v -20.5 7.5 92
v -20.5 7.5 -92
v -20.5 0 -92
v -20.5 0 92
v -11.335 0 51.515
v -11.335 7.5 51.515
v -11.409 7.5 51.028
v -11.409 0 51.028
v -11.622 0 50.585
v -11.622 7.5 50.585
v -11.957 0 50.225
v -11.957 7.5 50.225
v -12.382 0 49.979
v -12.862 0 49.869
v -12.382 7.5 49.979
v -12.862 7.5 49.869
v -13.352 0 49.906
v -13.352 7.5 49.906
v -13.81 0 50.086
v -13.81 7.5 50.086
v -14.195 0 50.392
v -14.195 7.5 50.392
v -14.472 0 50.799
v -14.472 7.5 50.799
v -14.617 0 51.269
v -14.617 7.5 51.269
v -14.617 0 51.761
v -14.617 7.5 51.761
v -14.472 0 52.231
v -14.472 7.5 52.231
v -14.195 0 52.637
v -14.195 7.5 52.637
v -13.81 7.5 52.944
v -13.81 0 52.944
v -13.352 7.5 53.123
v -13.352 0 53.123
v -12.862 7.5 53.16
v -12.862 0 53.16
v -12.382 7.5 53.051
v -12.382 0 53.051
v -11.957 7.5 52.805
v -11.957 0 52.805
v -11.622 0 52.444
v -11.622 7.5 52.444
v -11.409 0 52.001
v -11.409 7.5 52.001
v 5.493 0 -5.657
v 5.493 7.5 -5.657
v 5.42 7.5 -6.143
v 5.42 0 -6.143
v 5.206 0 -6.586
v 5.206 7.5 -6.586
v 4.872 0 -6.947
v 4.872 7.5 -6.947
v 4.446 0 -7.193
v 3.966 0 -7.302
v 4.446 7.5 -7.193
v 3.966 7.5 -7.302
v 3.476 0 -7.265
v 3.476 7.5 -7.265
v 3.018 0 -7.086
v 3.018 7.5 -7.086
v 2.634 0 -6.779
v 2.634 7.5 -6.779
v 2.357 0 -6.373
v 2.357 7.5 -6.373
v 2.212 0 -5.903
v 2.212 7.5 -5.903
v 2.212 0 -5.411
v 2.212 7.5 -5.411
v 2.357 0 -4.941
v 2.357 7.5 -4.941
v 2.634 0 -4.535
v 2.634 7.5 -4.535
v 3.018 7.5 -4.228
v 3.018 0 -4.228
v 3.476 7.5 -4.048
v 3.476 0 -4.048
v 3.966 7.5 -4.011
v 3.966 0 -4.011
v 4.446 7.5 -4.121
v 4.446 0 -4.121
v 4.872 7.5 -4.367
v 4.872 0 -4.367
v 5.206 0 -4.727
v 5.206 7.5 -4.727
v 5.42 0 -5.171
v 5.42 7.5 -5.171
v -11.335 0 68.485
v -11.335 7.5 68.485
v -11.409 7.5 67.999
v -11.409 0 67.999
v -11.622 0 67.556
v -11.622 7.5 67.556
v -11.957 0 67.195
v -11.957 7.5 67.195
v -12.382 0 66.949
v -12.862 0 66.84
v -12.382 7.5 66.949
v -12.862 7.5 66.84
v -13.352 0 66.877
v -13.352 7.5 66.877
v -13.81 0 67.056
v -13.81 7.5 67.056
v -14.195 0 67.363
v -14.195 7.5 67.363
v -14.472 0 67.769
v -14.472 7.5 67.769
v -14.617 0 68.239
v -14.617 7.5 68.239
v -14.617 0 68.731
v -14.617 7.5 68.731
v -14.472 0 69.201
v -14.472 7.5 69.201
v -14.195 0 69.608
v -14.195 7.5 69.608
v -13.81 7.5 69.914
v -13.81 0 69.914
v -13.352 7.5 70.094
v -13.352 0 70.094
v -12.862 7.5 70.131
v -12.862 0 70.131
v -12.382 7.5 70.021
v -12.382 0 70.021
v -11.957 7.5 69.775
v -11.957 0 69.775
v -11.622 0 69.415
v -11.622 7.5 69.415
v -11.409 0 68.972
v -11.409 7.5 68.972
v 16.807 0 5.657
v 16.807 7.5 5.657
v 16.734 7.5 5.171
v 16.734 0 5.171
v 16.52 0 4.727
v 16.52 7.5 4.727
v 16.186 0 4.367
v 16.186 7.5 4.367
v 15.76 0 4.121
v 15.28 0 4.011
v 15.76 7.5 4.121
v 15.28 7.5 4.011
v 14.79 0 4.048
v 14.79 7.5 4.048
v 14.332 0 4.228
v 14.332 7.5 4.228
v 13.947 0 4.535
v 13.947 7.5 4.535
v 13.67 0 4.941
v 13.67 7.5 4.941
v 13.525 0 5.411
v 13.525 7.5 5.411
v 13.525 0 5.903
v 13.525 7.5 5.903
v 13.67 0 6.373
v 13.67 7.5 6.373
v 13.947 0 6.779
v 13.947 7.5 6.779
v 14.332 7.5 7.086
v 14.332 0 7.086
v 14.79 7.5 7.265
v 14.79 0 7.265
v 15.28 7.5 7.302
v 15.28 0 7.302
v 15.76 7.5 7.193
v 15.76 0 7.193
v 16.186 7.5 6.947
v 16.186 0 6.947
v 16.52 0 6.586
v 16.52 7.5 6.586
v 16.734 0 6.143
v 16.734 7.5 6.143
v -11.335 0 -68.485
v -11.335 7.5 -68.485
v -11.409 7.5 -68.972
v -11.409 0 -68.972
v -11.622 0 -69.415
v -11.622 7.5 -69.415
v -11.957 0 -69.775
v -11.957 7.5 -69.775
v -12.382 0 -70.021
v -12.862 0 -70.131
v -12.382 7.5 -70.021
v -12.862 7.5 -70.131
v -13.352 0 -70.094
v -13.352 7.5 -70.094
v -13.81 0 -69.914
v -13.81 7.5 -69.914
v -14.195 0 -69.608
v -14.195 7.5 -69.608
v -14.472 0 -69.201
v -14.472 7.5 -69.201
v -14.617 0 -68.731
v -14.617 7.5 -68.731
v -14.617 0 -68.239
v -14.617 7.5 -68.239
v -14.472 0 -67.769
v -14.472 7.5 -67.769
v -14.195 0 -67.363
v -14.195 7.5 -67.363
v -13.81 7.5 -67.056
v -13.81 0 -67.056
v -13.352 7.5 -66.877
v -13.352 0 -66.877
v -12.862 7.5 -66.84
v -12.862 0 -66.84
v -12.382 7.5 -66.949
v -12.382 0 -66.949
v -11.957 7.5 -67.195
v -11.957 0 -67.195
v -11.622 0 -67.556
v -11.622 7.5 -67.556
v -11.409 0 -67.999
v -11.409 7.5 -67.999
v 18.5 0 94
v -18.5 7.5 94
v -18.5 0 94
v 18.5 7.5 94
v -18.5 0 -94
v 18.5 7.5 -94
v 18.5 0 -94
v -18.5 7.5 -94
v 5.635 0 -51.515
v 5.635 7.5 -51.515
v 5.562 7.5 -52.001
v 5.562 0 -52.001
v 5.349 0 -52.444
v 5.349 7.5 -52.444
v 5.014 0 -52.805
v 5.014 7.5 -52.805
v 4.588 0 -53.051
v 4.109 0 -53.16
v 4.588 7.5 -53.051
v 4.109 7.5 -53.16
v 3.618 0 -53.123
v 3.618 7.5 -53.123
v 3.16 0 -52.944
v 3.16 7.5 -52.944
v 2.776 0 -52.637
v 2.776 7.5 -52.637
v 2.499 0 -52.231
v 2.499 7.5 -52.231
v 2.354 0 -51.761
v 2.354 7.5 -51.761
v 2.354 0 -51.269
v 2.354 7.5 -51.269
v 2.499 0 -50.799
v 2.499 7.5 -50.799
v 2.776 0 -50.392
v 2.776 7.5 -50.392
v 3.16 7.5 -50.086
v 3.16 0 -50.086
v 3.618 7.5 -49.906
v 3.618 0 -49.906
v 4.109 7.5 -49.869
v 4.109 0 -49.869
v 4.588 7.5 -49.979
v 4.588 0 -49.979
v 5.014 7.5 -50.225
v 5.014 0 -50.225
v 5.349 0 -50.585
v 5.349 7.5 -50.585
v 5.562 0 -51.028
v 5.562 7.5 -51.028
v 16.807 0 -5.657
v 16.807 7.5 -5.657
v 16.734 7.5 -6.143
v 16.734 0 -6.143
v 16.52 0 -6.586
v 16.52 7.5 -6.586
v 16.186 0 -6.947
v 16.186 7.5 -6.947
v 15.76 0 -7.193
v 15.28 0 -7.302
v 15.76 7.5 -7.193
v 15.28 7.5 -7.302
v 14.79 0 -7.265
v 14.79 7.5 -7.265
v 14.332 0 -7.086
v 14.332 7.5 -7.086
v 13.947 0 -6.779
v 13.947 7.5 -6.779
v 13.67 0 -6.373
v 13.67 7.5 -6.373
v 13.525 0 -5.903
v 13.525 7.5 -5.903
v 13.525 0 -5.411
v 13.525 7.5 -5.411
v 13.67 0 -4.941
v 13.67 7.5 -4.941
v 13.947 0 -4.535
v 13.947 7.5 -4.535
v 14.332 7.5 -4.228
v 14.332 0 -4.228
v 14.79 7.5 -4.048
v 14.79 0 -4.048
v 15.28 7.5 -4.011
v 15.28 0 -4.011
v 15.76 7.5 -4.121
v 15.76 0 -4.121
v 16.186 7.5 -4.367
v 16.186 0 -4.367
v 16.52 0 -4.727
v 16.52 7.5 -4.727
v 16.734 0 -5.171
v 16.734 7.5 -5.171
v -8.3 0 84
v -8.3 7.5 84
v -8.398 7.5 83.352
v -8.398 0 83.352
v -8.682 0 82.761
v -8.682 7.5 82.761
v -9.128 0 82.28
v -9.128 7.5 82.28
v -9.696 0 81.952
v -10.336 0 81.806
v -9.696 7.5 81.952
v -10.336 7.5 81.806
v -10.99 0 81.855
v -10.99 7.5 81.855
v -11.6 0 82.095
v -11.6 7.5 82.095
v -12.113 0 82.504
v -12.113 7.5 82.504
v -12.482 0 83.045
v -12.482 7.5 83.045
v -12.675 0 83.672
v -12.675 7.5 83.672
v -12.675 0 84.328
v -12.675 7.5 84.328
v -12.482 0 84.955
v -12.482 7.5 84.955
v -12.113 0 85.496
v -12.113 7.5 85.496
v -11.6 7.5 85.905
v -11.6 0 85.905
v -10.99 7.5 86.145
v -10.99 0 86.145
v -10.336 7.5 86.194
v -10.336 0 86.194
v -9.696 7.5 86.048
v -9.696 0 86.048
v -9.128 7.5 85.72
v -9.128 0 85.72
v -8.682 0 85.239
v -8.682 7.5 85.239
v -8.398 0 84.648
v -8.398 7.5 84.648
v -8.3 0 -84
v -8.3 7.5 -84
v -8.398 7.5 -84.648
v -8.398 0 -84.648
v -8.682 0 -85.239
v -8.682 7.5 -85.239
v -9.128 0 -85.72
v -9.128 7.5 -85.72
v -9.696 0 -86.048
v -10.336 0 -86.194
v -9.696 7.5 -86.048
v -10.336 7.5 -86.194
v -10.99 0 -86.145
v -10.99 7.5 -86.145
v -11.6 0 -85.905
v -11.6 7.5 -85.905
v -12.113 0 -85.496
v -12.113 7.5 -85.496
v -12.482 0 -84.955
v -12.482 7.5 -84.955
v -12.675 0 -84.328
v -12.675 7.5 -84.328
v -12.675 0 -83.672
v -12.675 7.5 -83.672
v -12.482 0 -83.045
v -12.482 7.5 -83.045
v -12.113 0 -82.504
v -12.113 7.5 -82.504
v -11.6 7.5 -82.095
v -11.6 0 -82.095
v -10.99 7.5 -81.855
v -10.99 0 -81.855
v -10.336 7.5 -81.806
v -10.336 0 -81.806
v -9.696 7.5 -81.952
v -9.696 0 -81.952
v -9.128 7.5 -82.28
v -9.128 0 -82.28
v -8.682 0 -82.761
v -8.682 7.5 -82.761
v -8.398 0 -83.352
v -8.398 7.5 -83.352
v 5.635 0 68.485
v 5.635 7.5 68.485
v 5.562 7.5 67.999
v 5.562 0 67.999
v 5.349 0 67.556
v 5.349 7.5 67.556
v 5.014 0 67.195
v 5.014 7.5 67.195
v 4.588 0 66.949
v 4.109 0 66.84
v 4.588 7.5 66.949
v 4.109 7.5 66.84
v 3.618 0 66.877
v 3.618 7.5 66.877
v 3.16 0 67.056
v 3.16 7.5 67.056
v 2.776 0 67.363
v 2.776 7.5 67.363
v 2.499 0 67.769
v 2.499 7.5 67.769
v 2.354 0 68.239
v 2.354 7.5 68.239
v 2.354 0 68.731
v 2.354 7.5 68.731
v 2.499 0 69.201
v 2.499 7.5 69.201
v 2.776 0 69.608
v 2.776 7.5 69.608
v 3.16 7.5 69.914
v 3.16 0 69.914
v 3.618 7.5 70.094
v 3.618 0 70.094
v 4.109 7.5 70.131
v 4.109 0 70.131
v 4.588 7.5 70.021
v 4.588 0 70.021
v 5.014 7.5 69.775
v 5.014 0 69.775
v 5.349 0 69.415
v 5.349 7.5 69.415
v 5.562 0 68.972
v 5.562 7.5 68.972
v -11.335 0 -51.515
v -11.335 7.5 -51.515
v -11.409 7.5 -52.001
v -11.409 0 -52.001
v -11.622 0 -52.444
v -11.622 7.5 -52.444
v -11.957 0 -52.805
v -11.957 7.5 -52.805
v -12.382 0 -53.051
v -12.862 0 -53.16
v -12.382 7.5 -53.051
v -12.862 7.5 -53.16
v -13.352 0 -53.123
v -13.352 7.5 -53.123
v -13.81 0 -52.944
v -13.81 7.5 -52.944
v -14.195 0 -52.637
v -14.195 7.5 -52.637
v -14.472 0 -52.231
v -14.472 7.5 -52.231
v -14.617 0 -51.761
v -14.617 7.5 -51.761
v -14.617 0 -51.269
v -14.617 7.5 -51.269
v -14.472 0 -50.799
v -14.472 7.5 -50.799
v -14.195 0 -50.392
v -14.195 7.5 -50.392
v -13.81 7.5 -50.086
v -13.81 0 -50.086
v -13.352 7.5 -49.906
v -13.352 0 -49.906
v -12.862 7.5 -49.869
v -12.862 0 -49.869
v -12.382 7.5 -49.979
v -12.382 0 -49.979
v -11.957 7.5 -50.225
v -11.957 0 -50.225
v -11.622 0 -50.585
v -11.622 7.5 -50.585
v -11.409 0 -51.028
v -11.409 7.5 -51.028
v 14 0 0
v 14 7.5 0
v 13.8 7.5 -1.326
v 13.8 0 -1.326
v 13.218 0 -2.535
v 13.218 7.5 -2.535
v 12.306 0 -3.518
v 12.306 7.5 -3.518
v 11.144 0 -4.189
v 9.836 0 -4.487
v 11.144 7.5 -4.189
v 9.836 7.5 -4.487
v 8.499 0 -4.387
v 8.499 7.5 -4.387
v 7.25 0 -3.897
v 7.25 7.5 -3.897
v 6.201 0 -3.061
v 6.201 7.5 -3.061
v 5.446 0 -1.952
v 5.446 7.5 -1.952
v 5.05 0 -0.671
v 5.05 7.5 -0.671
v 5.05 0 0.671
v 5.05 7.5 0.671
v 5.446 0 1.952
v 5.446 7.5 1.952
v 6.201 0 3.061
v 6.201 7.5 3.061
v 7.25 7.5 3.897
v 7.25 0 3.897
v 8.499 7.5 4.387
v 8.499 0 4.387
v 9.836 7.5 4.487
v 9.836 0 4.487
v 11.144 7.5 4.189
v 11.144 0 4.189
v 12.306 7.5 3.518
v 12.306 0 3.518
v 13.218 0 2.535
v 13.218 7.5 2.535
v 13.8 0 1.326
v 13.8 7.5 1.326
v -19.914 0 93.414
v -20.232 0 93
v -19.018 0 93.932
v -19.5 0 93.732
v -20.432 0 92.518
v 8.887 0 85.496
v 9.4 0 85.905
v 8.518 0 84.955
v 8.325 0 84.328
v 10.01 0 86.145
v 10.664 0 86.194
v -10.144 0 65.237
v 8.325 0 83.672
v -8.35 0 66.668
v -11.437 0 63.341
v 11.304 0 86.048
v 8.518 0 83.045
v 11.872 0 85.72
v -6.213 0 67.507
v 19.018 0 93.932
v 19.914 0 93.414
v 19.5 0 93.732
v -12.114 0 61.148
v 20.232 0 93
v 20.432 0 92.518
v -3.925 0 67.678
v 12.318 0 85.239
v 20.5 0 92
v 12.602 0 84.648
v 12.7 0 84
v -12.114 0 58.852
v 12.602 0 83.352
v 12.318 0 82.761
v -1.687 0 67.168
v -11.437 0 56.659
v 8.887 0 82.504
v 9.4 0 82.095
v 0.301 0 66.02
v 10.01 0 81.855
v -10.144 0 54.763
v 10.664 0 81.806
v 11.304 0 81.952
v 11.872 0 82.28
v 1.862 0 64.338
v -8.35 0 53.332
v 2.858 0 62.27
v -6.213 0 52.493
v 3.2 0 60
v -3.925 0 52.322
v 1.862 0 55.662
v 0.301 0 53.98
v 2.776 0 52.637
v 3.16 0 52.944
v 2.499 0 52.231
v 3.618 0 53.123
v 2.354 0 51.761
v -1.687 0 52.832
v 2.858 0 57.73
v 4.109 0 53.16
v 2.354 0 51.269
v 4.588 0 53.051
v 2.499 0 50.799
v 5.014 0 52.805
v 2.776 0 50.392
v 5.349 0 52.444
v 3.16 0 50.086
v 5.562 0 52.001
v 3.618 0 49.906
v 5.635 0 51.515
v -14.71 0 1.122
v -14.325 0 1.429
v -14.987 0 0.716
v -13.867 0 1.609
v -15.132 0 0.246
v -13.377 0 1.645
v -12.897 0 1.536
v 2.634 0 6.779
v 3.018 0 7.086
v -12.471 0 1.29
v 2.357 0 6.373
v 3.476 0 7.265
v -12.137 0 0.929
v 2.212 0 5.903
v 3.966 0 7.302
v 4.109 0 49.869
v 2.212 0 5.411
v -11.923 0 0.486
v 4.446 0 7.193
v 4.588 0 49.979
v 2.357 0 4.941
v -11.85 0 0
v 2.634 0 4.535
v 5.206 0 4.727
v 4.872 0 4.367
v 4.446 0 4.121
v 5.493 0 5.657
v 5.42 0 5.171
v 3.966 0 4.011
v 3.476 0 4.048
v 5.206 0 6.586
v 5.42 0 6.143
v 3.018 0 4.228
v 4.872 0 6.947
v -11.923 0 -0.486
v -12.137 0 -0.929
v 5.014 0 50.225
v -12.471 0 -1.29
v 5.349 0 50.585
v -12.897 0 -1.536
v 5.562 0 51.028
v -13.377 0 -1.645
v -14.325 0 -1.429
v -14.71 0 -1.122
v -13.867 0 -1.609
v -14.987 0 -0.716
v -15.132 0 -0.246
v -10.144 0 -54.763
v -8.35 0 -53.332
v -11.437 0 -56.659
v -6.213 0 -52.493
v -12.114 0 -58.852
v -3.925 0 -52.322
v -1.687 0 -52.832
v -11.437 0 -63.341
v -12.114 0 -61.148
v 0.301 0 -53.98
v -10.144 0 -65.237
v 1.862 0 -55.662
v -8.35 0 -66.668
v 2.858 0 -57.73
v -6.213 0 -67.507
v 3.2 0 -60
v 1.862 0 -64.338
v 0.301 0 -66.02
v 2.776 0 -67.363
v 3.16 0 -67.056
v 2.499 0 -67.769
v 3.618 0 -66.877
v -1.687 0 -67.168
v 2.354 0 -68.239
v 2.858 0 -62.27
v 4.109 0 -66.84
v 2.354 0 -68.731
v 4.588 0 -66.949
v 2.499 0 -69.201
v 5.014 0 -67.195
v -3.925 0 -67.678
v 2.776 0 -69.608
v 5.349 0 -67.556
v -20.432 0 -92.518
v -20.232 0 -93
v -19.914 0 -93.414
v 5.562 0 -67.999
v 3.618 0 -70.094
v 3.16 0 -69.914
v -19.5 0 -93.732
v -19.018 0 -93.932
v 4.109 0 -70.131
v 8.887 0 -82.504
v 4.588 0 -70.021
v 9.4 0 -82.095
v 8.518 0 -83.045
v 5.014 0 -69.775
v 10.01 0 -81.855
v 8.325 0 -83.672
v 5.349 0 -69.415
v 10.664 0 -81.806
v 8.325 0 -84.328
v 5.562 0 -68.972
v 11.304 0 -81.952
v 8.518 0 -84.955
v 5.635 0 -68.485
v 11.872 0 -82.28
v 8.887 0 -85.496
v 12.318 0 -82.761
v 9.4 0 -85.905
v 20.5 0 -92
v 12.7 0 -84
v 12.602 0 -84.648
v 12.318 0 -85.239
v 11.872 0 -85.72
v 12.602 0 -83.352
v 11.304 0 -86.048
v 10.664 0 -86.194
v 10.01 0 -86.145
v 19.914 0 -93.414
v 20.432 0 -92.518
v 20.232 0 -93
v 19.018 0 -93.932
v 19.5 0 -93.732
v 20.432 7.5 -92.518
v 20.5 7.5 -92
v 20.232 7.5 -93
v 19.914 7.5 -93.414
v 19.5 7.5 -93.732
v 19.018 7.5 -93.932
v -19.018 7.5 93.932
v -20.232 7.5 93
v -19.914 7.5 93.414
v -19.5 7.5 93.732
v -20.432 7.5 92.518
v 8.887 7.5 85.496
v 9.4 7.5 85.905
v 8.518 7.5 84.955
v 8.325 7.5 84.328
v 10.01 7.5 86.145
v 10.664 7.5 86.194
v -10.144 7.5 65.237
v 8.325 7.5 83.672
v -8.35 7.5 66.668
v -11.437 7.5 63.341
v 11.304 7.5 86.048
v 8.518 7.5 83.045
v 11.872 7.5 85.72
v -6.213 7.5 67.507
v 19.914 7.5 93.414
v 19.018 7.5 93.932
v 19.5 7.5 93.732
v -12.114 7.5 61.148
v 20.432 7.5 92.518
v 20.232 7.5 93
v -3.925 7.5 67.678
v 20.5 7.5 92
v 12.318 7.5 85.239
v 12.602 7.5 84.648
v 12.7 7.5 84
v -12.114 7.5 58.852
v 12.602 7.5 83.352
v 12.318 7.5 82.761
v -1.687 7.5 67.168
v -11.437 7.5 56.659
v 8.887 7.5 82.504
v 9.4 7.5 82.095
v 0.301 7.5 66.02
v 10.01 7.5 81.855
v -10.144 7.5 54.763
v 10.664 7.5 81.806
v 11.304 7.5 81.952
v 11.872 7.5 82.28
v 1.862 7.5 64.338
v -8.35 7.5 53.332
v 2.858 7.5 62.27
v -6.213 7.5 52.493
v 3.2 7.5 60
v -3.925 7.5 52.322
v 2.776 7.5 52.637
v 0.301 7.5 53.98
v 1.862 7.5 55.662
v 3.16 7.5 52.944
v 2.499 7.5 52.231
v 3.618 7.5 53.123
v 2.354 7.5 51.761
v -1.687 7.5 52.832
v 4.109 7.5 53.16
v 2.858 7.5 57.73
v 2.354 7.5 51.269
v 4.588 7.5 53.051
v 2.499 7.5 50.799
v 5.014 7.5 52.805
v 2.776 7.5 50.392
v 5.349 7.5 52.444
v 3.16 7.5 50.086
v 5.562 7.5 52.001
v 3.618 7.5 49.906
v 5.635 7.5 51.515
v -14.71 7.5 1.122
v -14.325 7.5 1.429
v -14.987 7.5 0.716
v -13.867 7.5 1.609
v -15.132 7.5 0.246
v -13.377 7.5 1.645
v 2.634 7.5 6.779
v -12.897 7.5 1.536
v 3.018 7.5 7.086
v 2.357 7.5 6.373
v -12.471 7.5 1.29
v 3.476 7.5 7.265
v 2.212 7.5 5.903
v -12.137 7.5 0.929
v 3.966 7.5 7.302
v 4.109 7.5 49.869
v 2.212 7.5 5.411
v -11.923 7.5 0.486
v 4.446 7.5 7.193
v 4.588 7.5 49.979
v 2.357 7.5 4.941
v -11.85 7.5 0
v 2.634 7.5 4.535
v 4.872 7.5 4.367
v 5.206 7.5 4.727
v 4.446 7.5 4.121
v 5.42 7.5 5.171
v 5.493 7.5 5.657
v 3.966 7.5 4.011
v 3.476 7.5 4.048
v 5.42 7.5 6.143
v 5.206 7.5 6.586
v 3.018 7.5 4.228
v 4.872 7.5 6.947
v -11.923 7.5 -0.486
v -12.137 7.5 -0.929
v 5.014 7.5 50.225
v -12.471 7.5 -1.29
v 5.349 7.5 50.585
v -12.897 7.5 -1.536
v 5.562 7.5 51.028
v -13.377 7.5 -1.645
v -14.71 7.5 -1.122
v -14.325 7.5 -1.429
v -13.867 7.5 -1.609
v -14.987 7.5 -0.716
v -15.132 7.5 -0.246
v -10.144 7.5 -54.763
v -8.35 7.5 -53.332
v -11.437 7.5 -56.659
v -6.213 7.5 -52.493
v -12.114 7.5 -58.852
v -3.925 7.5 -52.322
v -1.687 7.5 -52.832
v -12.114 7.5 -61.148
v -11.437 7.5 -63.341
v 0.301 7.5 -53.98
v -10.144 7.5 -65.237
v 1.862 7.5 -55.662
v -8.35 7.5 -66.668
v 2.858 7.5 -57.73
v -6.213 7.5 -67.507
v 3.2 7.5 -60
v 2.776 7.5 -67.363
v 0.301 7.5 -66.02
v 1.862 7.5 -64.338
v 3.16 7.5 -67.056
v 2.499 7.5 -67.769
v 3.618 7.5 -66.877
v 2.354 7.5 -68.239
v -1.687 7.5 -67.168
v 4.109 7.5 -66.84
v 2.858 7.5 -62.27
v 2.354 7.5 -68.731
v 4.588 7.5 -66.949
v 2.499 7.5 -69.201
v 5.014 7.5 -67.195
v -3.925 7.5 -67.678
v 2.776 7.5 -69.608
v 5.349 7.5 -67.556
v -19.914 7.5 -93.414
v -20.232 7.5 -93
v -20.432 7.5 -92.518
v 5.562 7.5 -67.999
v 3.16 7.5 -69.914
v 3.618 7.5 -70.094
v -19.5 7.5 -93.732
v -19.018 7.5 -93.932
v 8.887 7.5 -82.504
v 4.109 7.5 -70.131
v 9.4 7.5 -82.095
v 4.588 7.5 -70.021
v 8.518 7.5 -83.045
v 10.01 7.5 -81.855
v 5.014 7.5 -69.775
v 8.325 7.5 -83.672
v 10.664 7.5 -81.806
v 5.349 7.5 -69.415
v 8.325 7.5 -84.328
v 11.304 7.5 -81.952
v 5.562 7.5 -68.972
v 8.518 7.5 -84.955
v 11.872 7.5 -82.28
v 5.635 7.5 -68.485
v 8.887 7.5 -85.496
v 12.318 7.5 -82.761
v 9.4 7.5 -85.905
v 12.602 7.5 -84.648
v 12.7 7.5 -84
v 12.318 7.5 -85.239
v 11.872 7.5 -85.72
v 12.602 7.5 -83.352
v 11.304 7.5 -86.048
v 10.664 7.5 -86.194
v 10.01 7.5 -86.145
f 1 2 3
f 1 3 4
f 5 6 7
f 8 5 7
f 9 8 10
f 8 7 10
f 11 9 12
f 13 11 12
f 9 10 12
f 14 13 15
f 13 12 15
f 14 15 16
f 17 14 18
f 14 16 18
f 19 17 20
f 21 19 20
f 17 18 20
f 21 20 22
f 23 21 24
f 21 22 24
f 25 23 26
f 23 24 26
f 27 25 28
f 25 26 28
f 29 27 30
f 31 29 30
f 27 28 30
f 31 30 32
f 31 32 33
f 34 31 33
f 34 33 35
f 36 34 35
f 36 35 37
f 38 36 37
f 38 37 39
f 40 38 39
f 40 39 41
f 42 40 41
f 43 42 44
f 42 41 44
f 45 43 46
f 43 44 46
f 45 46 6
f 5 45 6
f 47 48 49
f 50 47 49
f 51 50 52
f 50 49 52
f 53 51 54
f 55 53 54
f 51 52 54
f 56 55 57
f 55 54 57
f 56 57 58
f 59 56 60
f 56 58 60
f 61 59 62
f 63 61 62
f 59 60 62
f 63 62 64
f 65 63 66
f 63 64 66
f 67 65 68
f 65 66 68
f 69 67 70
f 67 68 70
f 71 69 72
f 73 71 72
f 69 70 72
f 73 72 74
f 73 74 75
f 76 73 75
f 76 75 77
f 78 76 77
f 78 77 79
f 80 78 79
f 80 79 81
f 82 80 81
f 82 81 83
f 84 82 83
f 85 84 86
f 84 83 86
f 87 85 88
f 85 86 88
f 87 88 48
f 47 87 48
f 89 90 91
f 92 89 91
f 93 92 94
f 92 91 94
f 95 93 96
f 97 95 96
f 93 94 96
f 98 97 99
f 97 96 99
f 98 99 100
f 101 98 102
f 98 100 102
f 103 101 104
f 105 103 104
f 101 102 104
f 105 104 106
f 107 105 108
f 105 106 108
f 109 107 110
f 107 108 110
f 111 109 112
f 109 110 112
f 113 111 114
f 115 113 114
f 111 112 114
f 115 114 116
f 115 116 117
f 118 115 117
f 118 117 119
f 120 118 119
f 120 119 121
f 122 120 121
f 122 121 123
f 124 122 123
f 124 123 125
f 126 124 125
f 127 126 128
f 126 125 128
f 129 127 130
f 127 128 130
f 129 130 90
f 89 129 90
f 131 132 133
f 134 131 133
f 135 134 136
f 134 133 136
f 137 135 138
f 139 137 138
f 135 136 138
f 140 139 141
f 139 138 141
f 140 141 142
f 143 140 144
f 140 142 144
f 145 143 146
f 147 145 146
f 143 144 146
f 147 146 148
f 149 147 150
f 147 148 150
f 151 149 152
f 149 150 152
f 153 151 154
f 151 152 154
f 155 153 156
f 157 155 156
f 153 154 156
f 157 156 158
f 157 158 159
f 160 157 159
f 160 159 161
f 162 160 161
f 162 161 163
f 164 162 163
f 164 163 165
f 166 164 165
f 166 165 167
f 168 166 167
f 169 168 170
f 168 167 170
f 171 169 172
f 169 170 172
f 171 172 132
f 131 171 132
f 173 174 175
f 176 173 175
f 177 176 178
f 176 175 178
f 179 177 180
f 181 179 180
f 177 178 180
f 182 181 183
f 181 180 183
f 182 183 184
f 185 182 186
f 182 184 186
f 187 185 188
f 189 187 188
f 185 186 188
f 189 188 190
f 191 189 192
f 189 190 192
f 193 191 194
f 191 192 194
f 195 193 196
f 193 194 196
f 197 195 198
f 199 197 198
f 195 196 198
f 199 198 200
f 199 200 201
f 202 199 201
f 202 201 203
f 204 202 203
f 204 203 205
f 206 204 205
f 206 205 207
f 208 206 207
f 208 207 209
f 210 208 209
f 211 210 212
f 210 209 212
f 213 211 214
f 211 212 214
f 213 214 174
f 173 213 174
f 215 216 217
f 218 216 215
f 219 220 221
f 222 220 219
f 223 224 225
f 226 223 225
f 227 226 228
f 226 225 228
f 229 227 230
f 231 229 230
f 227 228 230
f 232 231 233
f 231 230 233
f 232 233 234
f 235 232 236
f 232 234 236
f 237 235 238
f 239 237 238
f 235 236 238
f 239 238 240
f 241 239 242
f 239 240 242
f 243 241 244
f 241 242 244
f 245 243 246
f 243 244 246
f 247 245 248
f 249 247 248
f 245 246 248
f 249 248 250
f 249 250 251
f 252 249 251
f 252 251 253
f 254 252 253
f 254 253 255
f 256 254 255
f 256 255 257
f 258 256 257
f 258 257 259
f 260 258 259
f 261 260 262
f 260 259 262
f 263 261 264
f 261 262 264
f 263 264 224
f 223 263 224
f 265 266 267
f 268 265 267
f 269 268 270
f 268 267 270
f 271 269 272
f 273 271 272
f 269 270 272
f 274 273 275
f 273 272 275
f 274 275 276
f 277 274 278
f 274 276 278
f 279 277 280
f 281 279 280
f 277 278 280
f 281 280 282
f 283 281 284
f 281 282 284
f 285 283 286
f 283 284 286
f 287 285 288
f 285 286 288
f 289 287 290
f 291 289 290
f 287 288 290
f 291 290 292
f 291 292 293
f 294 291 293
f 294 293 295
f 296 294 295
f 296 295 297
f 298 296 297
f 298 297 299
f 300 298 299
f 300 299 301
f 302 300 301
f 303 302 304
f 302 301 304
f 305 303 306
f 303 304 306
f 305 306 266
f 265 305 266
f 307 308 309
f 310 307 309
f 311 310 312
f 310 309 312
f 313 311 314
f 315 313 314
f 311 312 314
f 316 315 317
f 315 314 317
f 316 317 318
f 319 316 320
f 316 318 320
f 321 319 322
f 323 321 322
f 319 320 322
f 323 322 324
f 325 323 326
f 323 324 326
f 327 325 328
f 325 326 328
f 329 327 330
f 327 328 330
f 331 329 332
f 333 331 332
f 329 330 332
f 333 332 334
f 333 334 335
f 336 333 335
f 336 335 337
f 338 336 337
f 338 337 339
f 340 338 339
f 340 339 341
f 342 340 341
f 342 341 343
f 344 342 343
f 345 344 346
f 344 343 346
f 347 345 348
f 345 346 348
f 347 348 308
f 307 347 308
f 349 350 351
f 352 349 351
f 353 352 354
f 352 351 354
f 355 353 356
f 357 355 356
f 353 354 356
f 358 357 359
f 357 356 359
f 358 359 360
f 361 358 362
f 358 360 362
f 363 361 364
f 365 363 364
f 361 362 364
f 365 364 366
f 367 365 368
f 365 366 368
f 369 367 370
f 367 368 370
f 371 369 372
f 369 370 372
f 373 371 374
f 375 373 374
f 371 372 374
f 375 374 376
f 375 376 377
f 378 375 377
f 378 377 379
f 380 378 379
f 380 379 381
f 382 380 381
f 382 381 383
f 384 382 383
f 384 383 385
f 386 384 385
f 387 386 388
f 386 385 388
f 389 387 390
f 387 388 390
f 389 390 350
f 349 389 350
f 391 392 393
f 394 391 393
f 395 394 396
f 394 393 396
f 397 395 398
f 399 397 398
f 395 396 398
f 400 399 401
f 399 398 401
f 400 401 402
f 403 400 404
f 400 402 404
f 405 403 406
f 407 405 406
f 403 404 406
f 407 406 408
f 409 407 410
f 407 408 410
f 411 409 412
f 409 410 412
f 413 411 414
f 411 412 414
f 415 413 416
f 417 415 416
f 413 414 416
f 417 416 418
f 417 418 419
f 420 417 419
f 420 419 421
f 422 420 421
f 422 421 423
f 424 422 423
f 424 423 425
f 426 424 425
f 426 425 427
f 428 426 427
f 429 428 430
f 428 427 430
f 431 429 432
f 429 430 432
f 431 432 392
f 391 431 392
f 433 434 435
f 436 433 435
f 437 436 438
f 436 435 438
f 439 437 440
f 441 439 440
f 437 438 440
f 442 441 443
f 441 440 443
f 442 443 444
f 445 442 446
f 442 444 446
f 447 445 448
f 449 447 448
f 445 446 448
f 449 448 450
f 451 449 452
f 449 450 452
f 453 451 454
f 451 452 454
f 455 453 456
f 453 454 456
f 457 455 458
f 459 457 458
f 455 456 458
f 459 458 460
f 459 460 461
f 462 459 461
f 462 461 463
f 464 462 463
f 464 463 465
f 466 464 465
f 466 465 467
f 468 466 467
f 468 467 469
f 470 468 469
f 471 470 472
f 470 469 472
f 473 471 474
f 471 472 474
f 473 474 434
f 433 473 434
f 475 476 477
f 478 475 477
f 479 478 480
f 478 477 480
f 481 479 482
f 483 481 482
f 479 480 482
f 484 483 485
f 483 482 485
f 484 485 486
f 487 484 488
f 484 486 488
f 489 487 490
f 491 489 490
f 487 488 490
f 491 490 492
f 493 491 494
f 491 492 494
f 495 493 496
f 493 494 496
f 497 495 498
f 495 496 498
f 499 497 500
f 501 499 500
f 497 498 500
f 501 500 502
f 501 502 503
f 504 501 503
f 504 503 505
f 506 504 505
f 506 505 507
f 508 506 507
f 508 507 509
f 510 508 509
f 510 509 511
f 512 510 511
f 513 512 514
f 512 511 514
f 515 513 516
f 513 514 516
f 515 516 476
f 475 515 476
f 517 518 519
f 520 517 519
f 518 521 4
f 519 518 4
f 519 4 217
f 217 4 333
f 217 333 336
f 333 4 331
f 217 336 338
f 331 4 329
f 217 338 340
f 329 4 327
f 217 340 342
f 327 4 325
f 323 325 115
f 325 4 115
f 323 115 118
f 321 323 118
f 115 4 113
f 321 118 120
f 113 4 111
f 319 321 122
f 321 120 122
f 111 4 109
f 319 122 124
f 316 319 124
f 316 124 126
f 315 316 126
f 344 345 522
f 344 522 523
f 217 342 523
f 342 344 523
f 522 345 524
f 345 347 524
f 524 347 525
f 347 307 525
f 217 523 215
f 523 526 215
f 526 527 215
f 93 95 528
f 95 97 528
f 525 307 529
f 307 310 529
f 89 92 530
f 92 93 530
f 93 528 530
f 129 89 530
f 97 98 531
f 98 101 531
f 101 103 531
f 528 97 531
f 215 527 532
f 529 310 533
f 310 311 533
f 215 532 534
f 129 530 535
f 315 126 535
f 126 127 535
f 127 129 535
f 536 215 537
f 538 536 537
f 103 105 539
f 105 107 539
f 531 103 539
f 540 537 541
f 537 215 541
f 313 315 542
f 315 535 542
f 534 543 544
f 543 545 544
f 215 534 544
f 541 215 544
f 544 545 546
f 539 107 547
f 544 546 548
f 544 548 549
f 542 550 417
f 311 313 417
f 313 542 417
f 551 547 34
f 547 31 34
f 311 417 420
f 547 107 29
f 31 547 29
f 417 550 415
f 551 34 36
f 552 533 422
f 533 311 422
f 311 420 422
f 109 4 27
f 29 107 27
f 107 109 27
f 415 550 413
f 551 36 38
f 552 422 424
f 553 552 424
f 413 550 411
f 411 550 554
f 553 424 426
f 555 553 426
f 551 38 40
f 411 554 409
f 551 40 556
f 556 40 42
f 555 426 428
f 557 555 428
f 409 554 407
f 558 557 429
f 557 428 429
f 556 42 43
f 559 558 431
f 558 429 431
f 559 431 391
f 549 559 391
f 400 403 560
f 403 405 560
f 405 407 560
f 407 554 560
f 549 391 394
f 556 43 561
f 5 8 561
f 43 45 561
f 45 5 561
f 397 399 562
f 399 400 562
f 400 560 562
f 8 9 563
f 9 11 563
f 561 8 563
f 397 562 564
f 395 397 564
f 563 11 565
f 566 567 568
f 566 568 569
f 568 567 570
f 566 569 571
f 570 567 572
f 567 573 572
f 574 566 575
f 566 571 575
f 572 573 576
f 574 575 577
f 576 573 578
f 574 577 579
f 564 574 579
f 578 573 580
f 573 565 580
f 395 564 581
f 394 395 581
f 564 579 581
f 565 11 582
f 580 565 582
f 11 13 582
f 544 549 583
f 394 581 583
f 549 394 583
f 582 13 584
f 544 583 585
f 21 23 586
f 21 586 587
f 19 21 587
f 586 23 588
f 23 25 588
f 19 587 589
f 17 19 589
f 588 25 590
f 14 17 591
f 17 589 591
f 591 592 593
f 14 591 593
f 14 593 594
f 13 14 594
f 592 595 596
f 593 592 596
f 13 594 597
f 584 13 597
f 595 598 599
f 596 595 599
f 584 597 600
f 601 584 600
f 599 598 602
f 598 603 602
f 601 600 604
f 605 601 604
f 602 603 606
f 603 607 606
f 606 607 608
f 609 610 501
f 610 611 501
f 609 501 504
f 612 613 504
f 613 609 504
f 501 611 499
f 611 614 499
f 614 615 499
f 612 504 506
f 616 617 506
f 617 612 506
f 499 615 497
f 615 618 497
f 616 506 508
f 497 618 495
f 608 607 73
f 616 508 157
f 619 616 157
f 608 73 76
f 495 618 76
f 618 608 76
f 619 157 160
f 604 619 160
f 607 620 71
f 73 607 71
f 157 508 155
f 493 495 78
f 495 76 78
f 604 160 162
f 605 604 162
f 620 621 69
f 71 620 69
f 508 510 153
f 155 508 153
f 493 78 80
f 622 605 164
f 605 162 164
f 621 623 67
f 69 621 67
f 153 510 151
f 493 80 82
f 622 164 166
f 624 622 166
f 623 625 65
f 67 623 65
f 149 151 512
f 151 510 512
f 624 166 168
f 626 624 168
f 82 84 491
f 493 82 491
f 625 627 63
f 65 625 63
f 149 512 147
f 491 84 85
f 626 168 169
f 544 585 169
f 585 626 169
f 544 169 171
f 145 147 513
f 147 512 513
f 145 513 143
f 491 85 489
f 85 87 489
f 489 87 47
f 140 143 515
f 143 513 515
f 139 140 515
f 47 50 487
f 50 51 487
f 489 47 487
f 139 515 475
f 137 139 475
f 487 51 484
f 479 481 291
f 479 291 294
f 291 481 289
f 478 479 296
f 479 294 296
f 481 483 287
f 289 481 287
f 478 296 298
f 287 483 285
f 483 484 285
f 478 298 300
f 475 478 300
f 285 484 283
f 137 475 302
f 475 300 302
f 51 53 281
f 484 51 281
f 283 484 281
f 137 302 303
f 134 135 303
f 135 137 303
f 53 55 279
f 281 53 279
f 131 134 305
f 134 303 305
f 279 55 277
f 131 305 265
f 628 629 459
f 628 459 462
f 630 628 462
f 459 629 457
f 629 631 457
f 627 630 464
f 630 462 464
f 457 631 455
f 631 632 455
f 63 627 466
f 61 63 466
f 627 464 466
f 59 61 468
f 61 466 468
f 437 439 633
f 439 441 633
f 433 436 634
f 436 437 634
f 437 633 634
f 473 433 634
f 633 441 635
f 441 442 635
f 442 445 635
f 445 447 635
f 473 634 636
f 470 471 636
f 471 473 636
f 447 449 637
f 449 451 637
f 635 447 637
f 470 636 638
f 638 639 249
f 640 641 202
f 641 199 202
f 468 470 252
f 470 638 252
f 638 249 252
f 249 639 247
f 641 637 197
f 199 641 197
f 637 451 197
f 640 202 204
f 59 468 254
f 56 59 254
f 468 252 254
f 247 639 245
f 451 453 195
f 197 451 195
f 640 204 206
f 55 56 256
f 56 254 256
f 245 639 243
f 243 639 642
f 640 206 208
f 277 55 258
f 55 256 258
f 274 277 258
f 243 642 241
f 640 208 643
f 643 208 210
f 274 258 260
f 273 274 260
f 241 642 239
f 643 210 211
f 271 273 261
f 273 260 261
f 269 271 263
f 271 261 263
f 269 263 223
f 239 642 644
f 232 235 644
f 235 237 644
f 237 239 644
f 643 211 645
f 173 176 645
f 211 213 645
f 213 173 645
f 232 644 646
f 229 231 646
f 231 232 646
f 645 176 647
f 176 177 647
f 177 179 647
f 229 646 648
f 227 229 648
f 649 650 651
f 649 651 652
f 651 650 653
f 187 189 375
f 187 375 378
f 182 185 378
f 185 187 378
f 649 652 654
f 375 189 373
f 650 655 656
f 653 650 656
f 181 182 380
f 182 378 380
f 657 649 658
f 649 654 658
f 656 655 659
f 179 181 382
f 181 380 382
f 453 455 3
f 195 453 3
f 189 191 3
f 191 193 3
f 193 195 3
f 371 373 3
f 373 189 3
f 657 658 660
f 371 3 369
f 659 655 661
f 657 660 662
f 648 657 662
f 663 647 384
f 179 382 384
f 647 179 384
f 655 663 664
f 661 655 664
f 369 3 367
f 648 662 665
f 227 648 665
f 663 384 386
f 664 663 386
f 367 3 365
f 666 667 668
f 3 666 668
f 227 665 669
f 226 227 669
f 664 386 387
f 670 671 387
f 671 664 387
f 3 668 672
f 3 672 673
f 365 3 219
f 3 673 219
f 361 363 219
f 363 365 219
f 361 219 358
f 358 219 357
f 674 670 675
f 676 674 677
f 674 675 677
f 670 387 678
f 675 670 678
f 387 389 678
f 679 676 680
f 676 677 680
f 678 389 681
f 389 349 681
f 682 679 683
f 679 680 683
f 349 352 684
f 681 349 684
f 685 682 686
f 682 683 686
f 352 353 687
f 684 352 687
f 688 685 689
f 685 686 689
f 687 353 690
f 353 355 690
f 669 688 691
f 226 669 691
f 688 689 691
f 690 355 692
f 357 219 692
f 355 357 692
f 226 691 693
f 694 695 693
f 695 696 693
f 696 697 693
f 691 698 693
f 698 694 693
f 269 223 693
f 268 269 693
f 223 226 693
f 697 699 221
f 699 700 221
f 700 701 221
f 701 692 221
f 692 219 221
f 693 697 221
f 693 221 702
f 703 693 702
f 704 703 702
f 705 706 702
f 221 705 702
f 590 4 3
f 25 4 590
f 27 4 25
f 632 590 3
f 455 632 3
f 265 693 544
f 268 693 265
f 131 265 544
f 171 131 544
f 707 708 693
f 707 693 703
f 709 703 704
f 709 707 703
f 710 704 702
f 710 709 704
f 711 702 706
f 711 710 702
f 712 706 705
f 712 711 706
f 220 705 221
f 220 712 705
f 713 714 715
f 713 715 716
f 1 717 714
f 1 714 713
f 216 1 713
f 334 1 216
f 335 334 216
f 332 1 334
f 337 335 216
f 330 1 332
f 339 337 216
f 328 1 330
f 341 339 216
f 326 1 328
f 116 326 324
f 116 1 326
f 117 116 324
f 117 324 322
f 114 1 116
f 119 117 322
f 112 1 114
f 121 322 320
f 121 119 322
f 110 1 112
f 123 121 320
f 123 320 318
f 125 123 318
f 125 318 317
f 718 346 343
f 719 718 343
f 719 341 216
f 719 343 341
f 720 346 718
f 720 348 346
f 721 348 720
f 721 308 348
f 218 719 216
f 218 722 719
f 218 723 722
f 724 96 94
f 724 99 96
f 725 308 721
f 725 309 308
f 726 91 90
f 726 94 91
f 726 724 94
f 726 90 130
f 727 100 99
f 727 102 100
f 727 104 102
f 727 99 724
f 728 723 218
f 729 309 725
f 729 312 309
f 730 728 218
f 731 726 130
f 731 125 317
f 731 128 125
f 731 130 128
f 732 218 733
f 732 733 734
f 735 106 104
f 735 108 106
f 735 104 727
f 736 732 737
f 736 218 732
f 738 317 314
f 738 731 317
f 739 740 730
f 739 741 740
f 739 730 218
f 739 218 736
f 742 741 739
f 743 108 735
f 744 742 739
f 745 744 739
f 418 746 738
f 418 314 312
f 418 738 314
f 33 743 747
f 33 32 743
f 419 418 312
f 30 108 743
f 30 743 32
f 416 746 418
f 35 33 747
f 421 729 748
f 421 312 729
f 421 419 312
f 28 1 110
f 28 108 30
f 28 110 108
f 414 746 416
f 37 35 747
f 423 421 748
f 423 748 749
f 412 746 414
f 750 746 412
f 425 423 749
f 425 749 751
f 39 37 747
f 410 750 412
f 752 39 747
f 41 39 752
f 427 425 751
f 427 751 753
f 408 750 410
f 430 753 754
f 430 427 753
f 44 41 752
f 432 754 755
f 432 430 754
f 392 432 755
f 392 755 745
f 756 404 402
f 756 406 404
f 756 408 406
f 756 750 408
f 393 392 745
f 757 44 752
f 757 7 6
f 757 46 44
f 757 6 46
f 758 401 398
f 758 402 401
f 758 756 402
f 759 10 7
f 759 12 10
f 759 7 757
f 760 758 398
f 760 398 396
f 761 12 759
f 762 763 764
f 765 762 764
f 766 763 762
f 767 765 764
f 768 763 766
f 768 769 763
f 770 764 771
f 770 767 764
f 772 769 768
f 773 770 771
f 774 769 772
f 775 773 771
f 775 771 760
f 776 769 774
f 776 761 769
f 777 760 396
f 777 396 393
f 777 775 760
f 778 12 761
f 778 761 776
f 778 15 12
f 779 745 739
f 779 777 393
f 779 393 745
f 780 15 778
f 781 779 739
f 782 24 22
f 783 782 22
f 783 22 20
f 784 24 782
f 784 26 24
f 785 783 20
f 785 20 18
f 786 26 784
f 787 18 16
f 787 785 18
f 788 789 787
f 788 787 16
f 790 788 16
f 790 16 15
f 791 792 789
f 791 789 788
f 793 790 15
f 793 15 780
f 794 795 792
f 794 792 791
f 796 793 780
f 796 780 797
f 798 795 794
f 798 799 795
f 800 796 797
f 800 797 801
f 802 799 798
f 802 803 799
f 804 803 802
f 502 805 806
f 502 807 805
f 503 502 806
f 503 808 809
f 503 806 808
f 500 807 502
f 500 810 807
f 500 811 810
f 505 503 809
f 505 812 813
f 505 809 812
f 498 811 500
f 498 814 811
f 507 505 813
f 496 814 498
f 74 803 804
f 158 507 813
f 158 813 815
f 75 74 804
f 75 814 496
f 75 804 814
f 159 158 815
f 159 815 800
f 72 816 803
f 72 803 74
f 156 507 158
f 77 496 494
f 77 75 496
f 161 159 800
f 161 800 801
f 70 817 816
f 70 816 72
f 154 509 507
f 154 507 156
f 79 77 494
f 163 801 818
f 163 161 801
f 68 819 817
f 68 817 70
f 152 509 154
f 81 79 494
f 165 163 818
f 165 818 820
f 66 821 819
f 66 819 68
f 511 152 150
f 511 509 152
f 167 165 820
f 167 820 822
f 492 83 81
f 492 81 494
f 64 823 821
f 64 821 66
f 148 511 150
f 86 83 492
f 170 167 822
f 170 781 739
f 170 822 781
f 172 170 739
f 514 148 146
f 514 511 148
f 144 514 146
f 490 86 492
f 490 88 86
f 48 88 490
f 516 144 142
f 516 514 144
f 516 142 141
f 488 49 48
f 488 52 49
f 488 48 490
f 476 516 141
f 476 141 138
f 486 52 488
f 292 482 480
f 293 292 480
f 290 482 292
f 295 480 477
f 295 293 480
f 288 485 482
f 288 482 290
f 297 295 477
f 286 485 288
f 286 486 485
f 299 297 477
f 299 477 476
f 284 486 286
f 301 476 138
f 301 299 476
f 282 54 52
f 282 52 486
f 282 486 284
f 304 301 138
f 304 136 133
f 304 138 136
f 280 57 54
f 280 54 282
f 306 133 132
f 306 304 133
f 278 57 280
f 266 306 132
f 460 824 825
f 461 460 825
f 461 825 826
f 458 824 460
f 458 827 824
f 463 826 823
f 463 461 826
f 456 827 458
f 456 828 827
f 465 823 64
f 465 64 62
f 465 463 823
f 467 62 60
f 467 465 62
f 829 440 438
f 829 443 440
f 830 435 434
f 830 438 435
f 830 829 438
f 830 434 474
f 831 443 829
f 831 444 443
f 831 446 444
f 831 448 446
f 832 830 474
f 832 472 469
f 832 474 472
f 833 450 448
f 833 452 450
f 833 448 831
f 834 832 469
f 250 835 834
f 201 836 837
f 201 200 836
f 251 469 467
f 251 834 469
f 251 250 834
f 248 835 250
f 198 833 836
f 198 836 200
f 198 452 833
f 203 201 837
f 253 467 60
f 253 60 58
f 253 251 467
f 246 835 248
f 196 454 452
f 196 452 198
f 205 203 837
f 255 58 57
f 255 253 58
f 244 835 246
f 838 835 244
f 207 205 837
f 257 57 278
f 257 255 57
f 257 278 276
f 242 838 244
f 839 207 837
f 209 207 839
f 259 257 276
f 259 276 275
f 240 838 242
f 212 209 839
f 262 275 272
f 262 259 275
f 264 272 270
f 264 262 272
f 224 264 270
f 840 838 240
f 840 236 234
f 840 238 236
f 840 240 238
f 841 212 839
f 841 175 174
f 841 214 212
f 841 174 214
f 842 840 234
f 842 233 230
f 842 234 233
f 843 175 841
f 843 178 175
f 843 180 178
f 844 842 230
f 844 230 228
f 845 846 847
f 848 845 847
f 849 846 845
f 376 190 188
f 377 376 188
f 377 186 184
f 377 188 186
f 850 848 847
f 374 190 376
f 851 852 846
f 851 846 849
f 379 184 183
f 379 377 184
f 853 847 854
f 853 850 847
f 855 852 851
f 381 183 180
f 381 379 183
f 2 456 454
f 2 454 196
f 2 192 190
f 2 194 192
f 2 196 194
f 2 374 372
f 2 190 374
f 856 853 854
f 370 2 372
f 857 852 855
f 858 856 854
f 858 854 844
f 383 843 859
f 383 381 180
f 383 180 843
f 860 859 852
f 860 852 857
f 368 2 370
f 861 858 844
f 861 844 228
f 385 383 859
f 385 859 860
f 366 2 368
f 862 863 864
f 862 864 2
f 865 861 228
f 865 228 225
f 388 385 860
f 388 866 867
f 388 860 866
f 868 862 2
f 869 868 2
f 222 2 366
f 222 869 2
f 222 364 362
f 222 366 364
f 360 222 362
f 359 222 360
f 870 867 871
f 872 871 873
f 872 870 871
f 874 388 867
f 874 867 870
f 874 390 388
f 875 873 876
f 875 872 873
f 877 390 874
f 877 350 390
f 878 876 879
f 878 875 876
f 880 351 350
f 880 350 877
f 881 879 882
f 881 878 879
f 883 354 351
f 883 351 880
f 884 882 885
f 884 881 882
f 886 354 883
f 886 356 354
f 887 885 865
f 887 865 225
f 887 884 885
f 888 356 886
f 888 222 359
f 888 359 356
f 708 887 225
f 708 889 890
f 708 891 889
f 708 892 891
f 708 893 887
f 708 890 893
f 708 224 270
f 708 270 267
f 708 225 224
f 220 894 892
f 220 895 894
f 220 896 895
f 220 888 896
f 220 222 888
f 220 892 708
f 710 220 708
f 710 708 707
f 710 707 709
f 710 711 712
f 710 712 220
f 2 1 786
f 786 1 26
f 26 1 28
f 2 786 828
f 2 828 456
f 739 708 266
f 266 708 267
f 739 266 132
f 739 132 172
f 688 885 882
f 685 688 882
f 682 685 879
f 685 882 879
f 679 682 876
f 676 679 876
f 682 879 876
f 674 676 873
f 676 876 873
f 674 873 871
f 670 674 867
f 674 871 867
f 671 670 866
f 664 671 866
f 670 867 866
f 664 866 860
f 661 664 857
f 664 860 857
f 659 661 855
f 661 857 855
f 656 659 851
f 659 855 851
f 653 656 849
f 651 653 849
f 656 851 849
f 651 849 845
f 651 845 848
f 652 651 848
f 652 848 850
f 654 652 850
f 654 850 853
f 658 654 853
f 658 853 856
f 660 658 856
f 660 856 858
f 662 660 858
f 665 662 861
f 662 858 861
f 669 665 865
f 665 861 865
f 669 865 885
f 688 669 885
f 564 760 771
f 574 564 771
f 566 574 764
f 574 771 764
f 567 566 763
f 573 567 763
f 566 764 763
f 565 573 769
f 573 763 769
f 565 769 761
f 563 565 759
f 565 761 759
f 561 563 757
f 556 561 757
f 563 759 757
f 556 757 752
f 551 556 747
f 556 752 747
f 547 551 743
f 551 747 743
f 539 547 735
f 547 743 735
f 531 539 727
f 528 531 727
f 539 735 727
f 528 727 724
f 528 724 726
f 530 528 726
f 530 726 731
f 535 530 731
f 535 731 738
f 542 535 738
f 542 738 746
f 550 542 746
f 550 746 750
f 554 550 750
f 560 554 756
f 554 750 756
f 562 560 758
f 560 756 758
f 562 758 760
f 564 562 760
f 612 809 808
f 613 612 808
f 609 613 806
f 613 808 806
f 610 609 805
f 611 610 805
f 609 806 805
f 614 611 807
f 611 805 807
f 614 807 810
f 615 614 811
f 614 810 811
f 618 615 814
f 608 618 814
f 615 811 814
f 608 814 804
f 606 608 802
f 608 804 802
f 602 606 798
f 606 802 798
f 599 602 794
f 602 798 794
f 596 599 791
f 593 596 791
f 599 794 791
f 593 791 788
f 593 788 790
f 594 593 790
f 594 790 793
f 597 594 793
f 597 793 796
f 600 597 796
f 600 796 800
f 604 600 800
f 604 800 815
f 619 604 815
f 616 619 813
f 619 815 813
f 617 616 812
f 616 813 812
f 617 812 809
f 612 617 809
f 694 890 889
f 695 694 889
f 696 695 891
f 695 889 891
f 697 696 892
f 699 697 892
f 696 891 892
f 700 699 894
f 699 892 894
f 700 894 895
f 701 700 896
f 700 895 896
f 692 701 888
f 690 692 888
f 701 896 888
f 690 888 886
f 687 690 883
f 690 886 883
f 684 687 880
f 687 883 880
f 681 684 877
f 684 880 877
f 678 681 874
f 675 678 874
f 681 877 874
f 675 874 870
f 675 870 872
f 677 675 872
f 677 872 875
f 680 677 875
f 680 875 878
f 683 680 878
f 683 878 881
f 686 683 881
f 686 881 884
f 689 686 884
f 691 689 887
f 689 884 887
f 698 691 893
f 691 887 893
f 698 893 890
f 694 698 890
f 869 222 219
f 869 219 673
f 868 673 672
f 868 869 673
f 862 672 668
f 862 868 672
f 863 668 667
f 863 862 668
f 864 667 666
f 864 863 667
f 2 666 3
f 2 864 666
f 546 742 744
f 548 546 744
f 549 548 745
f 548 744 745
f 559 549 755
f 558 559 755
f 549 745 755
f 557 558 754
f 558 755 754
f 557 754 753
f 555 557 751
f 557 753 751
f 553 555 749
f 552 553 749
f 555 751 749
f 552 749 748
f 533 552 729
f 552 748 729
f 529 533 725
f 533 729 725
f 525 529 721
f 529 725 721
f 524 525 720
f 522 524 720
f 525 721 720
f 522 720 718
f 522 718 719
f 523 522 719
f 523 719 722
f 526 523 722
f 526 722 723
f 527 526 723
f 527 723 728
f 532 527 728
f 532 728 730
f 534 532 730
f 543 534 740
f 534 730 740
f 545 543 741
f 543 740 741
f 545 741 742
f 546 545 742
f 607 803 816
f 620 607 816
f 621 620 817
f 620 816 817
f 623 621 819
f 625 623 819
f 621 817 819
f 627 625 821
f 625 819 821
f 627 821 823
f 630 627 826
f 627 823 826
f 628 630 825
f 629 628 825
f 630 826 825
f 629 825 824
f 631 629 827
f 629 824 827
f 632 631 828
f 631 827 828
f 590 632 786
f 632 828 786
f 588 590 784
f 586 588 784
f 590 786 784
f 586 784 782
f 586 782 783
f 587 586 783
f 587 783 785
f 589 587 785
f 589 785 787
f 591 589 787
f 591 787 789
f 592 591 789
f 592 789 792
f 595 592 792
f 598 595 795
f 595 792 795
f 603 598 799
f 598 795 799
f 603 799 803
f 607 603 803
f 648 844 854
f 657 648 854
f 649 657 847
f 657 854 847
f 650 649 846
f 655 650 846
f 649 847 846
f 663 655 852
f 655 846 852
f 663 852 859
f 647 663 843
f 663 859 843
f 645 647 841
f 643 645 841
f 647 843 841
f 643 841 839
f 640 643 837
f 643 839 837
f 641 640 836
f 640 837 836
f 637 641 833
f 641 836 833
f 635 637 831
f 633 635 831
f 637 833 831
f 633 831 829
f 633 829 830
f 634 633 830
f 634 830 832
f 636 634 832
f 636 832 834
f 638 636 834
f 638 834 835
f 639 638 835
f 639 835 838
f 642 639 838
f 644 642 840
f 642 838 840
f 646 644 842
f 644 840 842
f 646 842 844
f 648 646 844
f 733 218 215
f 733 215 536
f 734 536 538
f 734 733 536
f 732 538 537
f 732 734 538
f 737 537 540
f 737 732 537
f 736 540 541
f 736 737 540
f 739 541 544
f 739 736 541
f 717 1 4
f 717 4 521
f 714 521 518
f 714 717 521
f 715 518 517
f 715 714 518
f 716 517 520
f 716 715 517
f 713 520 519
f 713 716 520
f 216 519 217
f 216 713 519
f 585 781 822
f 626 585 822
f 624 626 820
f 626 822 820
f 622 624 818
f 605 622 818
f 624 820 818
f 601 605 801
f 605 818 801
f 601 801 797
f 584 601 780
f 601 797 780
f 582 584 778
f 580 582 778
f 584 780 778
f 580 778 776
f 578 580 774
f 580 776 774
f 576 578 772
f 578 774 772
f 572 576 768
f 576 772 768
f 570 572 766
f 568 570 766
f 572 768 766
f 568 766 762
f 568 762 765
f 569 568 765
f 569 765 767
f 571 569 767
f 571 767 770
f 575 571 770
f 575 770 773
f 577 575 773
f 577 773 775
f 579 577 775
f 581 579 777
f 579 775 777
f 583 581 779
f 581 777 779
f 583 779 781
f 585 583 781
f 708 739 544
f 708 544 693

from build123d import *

# Parameters (mm, degrees)
SKETCH1_R           = 2.2
SKETCH1_R_2         = 1.65
SKETCH1_R_3         = 7.7
SKETCH1_R_4         = 4.5
BOSS_EXTRUDE1_DEPTH = 7.5


with BuildPart() as part:
    # Sketch1 → Boss-Extrude1 (new body)
    with BuildSketch(Plane(origin=(0, 7.5, 0), x_dir=(1, 0, 0), z_dir=(0, 1, 0))):
        with BuildLine():
            Line((18.5, 94), (-18.5, 94))
            ThreePointArc((-18.5, 94), (-19.914213562, 93.414213562), (-20.5, 92))
            Line((-20.5, 92), (-20.5, -92))
            ThreePointArc((-20.5, -92), (-19.914213562, -93.414213562), (-18.5, -94))
            Line((-18.5, -94), (18.5, -94))
            ThreePointArc((18.5, -94), (19.914213562, -93.414213562), (20.5, -92))
            Line((20.5, -92), (20.5, 92))
            ThreePointArc((20.5, 92), (19.914213562, 93.414213562), (18.5, 94))
        make_face()
        with Locations((10.5, 84)):
            Circle(SKETCH1_R, mode=Mode.SUBTRACT)
        with Locations((-10.5, 84)):
            Circle(SKETCH1_R, mode=Mode.SUBTRACT)
        with Locations((10.5, -84)):
            Circle(SKETCH1_R, mode=Mode.SUBTRACT)
        with Locations((-10.5, -84)):
            Circle(SKETCH1_R, mode=Mode.SUBTRACT)
        with Locations((3.985281374, 51.514718626)):
            Circle(SKETCH1_R_2, mode=Mode.SUBTRACT)
        with Locations((15.156854249, 5.656854249)):
            Circle(SKETCH1_R_2, mode=Mode.SUBTRACT)
        with Locations((-12.985281374, -68.485281374)):
            Circle(SKETCH1_R_2, mode=Mode.SUBTRACT)
        with Locations((3.985281374, -68.485281374)):
            Circle(SKETCH1_R_2, mode=Mode.SUBTRACT)
        with Locations((-4.5, -60)):
            Circle(SKETCH1_R_3, mode=Mode.SUBTRACT)
        with Locations((9.5, 0)):
            Circle(SKETCH1_R_4, mode=Mode.SUBTRACT)
        with Locations((-12.985281374, -51.514718626)):
            Circle(SKETCH1_R_2, mode=Mode.SUBTRACT)
        with Locations((3.985281374, -51.514718626)):
            Circle(SKETCH1_R_2, mode=Mode.SUBTRACT)
        with Locations((3.985281374, 68.485281374)):
            Circle(SKETCH1_R_2, mode=Mode.SUBTRACT)
        with Locations((-12.985281374, 68.485281374)):
            Circle(SKETCH1_R_2, mode=Mode.SUBTRACT)
        with Locations((-12.985281374, 51.514718626)):
            Circle(SKETCH1_R_2, mode=Mode.SUBTRACT)
        with Locations((3.843145751, 5.656854249)):
            Circle(SKETCH1_R_2, mode=Mode.SUBTRACT)
        with Locations((3.843145751, -5.656854249)):
            Circle(SKETCH1_R_2, mode=Mode.SUBTRACT)
        with Locations((15.156854249, -5.656854249)):
            Circle(SKETCH1_R_2, mode=Mode.SUBTRACT)
        with Locations((-13.5, 0)):
            Circle(SKETCH1_R_2, mode=Mode.SUBTRACT)
        with Locations((-4.5, 60)):
            Circle(SKETCH1_R_3, mode=Mode.SUBTRACT)
    extrude(amount=-BOSS_EXTRUDE1_DEPTH)


solid = part.part
